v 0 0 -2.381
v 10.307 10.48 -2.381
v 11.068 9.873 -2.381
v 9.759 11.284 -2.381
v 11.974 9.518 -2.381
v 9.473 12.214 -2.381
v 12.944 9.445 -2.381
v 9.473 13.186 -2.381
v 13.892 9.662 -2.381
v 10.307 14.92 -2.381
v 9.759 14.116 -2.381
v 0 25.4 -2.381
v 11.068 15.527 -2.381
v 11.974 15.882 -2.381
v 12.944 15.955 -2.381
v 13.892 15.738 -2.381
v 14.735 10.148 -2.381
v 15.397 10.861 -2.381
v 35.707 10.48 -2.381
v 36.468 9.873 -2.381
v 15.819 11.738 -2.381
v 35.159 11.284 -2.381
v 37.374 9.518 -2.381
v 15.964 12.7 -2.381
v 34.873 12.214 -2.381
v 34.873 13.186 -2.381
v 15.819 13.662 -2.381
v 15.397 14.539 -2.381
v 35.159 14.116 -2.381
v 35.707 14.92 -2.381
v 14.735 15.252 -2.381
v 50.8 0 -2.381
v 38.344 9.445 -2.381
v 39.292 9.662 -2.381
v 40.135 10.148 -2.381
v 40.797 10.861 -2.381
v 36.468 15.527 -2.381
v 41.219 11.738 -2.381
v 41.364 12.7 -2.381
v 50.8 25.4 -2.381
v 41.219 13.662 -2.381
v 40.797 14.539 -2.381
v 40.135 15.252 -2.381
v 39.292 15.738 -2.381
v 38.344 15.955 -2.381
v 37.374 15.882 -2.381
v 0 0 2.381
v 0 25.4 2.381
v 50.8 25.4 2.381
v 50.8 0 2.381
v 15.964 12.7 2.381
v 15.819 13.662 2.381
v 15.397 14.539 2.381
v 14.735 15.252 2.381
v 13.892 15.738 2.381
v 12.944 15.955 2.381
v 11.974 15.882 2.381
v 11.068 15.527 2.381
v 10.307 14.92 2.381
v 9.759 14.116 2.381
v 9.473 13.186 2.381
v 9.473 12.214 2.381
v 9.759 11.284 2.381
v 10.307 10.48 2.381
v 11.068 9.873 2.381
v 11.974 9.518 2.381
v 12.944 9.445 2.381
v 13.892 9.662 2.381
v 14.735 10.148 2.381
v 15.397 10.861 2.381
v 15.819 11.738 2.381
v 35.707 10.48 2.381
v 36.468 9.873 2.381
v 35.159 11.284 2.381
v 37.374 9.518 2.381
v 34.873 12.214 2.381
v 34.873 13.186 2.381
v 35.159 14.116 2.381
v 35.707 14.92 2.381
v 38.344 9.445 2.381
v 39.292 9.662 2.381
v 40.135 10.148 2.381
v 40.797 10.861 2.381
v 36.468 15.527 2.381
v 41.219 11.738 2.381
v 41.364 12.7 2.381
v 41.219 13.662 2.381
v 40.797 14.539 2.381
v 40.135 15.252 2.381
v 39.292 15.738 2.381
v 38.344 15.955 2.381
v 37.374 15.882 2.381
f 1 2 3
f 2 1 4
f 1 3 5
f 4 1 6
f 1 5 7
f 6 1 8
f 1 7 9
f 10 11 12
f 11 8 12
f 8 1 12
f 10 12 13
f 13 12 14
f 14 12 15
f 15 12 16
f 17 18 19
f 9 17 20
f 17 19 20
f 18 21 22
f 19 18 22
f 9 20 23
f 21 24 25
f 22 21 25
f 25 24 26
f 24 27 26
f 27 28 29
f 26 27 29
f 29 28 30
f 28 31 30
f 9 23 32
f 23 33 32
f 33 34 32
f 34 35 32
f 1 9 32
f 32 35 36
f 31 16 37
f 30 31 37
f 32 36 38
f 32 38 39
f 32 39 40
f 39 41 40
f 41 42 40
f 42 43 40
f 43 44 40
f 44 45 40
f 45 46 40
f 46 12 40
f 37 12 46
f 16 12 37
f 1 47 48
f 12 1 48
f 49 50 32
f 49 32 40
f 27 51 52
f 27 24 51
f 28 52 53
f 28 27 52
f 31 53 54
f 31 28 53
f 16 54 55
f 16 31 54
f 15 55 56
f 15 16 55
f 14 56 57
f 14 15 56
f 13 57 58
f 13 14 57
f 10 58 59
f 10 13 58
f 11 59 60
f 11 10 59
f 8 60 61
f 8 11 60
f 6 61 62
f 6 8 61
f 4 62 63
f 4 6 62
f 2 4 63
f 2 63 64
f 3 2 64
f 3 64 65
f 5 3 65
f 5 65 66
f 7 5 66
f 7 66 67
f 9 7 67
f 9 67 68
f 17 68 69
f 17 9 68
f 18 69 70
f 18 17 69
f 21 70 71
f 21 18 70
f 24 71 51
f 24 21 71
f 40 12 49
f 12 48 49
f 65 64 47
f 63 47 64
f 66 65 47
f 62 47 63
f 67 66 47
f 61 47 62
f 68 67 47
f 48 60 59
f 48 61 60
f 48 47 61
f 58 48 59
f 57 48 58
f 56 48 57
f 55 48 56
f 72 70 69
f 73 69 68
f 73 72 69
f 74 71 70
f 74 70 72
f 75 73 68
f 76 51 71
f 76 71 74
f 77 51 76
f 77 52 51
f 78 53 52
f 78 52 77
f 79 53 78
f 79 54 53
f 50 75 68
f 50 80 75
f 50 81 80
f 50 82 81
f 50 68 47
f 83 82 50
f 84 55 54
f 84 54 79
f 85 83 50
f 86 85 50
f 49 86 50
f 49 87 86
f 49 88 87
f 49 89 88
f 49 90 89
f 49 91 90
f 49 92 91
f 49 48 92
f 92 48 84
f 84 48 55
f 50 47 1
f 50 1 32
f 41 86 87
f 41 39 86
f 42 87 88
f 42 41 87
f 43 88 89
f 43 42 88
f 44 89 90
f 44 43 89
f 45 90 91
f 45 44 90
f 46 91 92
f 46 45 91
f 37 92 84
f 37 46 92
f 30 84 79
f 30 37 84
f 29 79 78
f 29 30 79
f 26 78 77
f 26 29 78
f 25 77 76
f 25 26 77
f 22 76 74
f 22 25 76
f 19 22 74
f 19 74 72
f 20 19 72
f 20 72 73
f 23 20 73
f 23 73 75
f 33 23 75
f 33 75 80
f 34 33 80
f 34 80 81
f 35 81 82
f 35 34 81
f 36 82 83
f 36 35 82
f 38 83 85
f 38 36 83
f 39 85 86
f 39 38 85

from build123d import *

# Parameters (mm, degrees)
SKETCH1_W           = 50.8
SKETCH1_H           = 25.4
SKETCH1_R           = 3.2639
BOSS_EXTRUDE1_DEPTH = 2.38125


with BuildPart() as part:
    # Sketch1 → Boss-Extrude1 (new body, symmetric)
    with BuildSketch(Plane.XY):
        with Locations((25.4, 12.7)):
            Rectangle(SKETCH1_W, SKETCH1_H)
        with Locations((12.7, 12.7)):
            Circle(SKETCH1_R, mode=Mode.SUBTRACT)
        with Locations((38.1, 12.7)):
            Circle(SKETCH1_R, mode=Mode.SUBTRACT)
    extrude(amount=BOSS_EXTRUDE1_DEPTH, both=True)


solid = part.part
